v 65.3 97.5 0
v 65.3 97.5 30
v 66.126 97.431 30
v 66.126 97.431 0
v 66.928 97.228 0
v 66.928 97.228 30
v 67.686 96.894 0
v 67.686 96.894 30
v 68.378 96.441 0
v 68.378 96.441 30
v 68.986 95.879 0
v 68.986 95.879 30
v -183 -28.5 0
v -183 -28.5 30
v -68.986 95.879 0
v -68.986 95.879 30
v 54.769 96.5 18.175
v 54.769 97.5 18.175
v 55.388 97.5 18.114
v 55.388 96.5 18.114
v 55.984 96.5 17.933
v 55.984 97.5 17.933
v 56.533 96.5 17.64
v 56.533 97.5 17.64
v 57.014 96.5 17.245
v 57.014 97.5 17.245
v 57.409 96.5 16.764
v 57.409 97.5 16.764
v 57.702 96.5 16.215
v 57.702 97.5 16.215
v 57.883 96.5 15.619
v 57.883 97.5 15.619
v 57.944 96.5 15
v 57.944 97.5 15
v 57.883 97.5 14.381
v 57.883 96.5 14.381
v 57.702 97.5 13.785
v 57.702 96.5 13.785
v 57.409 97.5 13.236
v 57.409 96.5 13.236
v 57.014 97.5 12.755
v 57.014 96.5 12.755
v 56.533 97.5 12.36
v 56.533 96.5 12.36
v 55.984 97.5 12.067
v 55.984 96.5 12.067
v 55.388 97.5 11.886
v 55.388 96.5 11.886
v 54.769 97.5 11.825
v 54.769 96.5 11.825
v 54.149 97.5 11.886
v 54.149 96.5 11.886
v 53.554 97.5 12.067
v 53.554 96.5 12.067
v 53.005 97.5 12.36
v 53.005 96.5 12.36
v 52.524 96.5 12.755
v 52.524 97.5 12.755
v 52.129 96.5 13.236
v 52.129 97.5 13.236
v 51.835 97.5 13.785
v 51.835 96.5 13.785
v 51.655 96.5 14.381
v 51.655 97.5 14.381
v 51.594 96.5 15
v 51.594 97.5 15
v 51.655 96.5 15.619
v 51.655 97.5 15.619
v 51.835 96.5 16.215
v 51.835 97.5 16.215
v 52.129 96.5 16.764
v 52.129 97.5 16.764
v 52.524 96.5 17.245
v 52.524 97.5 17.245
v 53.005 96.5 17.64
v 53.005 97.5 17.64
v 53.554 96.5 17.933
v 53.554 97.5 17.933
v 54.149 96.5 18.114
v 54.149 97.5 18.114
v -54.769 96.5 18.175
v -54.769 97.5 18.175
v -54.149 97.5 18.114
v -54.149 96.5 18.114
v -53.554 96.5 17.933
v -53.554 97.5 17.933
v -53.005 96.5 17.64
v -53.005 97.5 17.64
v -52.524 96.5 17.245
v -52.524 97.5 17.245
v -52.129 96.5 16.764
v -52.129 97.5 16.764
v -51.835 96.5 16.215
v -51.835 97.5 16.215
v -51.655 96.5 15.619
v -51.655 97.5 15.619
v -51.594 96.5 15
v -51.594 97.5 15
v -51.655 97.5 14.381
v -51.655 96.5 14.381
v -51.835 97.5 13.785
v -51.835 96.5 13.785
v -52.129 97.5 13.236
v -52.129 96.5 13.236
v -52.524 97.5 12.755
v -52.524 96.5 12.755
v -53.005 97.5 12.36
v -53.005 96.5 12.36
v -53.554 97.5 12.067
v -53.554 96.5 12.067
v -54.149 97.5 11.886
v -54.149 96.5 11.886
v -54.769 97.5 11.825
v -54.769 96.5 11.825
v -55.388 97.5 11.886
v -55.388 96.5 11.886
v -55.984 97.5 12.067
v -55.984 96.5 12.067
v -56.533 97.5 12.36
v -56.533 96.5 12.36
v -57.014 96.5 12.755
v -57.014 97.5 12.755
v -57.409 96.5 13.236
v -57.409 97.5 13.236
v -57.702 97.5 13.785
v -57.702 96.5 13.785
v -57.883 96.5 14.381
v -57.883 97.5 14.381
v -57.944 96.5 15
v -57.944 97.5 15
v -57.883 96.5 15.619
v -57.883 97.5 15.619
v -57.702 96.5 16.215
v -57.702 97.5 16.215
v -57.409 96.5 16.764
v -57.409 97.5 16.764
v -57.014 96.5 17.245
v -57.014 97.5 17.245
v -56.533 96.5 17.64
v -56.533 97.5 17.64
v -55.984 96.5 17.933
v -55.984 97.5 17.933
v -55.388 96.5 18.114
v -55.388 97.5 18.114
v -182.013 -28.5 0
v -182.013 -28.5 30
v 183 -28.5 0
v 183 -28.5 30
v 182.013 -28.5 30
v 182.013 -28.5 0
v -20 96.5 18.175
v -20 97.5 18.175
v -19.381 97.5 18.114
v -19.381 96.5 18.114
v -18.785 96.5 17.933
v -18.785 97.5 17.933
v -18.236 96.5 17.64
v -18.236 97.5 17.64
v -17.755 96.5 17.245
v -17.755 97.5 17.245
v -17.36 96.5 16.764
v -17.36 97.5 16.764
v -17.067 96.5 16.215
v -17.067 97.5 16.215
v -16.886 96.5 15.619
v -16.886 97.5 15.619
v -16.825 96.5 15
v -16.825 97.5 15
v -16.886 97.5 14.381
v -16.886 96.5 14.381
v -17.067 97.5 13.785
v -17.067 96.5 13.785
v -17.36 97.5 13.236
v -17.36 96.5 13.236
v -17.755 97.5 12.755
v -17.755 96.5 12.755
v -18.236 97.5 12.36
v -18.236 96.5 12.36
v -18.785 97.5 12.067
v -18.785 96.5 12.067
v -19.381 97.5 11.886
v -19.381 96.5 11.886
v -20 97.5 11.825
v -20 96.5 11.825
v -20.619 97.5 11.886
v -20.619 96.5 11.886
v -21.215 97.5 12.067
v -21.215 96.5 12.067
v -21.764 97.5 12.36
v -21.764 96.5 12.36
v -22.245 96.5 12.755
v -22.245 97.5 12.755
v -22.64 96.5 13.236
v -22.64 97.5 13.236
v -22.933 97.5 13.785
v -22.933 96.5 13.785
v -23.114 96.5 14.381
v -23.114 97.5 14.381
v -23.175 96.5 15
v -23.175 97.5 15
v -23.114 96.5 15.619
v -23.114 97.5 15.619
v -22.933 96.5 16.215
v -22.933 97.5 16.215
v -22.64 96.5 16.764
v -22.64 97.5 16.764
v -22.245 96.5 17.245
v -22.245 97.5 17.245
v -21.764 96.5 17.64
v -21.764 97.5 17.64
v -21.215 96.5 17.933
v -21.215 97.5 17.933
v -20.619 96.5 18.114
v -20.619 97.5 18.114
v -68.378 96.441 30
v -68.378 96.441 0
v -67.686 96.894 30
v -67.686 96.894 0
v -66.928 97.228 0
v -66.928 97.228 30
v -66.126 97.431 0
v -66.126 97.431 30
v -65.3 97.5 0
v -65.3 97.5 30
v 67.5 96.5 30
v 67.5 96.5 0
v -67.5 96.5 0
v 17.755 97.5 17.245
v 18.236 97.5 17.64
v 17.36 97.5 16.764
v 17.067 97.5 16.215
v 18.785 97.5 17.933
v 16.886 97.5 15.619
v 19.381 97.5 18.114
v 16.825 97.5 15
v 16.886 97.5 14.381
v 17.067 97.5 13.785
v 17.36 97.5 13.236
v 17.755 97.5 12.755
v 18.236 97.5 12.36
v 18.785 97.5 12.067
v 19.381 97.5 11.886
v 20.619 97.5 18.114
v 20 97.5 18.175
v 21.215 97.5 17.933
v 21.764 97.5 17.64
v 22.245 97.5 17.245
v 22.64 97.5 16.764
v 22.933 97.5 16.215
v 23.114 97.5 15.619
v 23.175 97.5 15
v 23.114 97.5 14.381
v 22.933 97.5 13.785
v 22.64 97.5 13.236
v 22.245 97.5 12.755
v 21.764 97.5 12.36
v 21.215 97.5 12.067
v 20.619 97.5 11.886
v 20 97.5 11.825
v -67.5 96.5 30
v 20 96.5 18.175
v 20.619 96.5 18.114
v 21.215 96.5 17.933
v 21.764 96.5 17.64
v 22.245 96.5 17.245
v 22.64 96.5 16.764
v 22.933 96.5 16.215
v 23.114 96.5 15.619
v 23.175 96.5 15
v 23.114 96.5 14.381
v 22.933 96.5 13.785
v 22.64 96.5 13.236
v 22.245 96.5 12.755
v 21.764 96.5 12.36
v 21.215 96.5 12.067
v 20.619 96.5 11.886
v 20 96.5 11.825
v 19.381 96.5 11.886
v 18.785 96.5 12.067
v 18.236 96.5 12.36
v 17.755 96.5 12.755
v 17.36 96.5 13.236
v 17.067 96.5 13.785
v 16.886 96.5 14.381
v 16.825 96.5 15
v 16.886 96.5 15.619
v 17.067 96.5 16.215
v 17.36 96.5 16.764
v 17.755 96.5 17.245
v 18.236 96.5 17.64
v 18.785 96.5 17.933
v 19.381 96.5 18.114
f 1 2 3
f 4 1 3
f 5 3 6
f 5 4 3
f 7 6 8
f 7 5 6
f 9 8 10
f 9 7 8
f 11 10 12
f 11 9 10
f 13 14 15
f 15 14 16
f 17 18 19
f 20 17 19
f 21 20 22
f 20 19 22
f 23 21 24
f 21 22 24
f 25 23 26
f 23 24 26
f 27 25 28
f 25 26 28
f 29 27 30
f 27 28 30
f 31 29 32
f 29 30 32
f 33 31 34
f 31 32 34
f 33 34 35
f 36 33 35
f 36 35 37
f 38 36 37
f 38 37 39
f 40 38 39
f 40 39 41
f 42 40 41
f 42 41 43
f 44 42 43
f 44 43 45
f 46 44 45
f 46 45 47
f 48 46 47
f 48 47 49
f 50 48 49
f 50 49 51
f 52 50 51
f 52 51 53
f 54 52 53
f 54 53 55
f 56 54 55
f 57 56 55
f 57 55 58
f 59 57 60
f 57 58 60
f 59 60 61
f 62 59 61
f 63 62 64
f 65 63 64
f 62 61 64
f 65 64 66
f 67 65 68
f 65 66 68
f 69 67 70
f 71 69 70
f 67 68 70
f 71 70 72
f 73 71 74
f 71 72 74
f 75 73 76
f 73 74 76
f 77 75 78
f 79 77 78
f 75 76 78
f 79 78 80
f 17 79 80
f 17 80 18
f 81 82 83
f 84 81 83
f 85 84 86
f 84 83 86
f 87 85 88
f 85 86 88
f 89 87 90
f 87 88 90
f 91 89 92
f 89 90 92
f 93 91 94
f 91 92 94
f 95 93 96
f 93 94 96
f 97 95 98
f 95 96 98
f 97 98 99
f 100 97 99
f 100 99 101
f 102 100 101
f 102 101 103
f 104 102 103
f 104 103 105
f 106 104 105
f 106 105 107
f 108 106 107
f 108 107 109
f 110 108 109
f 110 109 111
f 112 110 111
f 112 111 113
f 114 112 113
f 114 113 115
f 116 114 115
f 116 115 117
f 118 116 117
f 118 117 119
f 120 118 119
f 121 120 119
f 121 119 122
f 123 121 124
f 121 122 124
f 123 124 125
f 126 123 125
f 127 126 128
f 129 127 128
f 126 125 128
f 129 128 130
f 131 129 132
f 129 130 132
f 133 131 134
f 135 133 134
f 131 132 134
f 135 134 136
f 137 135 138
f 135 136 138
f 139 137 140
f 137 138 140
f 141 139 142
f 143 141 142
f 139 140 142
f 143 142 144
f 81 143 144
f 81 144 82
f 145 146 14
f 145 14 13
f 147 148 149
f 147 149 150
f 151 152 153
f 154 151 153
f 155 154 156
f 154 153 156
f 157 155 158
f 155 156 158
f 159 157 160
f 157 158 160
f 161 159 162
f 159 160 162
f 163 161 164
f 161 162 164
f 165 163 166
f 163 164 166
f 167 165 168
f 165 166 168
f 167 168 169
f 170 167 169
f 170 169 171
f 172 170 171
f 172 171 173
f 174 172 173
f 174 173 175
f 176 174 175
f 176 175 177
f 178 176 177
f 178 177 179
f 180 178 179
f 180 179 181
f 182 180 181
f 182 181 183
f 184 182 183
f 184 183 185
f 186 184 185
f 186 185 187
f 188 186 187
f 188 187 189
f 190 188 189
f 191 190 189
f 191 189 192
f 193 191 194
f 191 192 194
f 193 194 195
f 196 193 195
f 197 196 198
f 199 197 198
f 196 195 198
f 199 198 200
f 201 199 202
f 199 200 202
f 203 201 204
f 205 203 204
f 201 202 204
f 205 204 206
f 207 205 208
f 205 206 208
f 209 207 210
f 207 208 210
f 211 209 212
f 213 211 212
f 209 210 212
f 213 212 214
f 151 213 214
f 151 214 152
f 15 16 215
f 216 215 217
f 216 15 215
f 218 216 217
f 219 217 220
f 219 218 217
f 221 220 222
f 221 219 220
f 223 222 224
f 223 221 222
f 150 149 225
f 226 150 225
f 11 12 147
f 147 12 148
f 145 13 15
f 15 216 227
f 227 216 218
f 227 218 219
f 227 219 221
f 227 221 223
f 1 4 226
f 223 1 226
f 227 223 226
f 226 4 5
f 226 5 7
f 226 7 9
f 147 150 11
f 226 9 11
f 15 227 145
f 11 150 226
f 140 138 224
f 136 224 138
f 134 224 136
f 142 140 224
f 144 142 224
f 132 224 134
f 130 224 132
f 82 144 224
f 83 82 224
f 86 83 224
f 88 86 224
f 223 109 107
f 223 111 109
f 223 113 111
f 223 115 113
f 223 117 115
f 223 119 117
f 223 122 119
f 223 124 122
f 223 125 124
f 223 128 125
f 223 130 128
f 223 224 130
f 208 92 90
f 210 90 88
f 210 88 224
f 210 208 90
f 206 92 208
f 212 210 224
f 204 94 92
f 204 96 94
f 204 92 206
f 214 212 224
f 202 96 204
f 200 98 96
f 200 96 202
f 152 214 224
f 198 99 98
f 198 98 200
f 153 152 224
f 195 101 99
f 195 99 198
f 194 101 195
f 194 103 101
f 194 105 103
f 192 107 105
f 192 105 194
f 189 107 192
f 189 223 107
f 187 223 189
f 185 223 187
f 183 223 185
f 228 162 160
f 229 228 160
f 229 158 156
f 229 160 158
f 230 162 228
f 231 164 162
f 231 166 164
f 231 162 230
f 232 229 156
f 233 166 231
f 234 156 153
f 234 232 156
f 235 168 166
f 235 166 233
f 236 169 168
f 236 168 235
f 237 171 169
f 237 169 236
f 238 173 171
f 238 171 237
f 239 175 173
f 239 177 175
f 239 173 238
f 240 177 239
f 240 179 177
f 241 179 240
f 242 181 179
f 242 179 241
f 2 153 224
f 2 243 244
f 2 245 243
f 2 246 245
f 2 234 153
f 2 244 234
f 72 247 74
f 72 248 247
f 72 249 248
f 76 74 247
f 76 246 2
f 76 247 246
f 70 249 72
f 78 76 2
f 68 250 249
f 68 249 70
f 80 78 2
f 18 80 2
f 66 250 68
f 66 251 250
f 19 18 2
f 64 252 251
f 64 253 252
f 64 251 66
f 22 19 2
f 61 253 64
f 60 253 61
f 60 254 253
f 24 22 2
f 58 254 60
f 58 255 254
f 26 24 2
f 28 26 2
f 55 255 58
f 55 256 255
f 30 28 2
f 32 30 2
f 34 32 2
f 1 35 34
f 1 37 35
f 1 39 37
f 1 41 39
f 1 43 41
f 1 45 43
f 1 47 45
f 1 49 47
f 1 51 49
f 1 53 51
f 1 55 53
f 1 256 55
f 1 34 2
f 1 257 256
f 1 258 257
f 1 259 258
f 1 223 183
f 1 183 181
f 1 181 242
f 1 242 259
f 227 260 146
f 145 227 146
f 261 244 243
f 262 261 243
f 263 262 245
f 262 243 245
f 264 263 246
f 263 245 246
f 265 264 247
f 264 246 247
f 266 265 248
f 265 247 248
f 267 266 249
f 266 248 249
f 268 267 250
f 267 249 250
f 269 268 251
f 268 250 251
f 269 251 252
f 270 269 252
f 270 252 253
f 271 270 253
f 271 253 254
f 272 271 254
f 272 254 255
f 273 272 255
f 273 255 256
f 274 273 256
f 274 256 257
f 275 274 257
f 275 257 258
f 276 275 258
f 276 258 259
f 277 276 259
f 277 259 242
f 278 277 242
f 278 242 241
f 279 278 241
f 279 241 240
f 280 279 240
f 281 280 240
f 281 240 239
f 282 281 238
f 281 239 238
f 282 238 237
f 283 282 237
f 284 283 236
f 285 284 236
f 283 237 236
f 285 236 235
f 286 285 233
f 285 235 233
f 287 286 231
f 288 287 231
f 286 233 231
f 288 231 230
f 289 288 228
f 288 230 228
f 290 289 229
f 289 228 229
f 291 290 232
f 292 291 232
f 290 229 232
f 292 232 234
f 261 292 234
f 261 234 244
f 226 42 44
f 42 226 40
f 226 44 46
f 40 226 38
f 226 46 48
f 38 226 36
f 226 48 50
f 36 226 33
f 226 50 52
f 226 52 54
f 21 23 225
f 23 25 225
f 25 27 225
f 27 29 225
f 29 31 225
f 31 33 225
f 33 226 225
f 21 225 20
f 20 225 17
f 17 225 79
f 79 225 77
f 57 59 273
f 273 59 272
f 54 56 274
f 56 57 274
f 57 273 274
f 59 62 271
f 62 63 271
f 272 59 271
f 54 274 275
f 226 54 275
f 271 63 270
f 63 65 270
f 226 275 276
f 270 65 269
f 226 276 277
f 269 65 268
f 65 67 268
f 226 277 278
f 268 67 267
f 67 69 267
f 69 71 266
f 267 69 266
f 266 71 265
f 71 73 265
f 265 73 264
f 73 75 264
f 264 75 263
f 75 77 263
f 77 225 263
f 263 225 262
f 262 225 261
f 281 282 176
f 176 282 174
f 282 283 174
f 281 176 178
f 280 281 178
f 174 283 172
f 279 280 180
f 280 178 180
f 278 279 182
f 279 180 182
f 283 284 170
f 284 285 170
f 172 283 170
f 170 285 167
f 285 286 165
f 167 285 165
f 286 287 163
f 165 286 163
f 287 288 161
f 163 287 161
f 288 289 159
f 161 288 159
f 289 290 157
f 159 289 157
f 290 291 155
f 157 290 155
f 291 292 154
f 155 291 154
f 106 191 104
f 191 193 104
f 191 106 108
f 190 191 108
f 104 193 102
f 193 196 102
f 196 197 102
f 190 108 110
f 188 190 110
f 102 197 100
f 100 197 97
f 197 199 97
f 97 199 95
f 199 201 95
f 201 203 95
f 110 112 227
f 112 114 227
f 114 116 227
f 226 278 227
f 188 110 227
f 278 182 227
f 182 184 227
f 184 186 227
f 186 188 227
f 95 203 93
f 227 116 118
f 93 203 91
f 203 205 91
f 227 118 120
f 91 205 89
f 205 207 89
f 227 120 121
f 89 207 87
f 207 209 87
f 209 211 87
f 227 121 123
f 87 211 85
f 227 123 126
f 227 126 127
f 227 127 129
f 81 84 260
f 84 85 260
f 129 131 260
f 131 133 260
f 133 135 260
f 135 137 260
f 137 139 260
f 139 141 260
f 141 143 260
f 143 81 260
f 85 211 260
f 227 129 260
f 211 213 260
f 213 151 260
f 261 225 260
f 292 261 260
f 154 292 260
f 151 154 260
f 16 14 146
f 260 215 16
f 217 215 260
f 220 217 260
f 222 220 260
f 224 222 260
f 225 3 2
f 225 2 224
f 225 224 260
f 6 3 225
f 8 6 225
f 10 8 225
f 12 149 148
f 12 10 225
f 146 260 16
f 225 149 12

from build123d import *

# Parameters (mm, degrees)
SKETCH1_W           = 410
SKETCH1_H           = 195
BOSS_EXTRUDE1_DEPTH = 30
CUT_EXTRUDE1_DEPTH  = 30
CUT_EXTRUDE2_DEPTH  = 30
FILLET1_R           = 5
FILLET4_R           = 5
FILLET5_R           = 5
FILLET6_R           = 5
SKETCH4_R           = 1.65
CUT_EXTRUDE3_DEPTH  = 423.5
SKETCH5_R           = 3.175
CUT_EXTRUDE4_DEPTH  = 10
SKETCH7_W           = 30
SKETCH7_H           = 69
CUT_EXTRUDE6_DEPTH  = 420


with BuildPart() as part:
    # Sketch1 → Boss-Extrude1 (new body)
    with BuildSketch(Plane.XY):
        Rectangle(SKETCH1_W, SKETCH1_H)
    extrude(amount=BOSS_EXTRUDE1_DEPTH)

    # Sketch2 → Cut-Extrude1 (cut)
    with BuildSketch(Plane.XY.offset(30)):
        Polygon((-205, 97.5), (-205, -52.5), (-67.5, 97.5), align=None)
        Polygon((205, 97.5), (67.5, 97.5), (205, -52.5), align=None)
    extrude(amount=-CUT_EXTRUDE1_DEPTH, mode=Mode.SUBTRACT)

    # Sketch3 → Cut-Extrude2 (cut)
    with BuildSketch(Plane.XY.offset(30)):
        Polygon((-67.5, 96.5), (-204, -52.5), (-204, -97.5), (204, -97.5), (204, -52.5), (67.5, 96.5), align=None)
    extrude(amount=-CUT_EXTRUDE2_DEPTH, mode=Mode.SUBTRACT)

    # Fillet1
    fillet1_edges = [part.edges().sort_by_distance(p)[0] for p in [
        (-205, -52.5, 15),
    ]]
    fillet(fillet1_edges, radius=FILLET1_R)

    # Fillet4
    fillet4_edges = [part.edges().sort_by_distance(p)[0] for p in [
        (-67.5, 97.5, 15),
    ]]
    fillet(fillet4_edges, radius=FILLET4_R)

    # Fillet5
    fillet5_edges = [part.edges().sort_by_distance(p)[0] for p in [
        (67.5, 97.5, 15),
    ]]
    fillet(fillet5_edges, radius=FILLET5_R)

    # Fillet6
    fillet6_edges = [part.edges().sort_by_distance(p)[0] for p in [
        (205, -52.5, 15),
    ]]
    fillet(fillet6_edges, radius=FILLET6_R)

    # Sketch4 → Cut-Extrude3 (cut, through all)
    with BuildSketch(Plane(origin=(205, 0, 0), x_dir=(0, 0, -1), z_dir=(1, 0, 0))):
        with Locations(Location((-15, -75.972459226, 0), (0, 0, 90))):
            Circle(SKETCH4_R)
    extrude(amount=-CUT_EXTRUDE3_DEPTH, mode=Mode.SUBTRACT)

    # Sketch5 → Cut-Extrude4 (cut)
    with BuildSketch(Plane(origin=(0, 97.5, 0), x_dir=(1, 0, 0), z_dir=(0, 1, 0))):
        with Locations(Location((-20, -15, 0), (0, 0, 270))):
            Circle(SKETCH5_R)
        with Locations(Location((20, -15, 0), (0, 0, 270))):
            Circle(SKETCH5_R)
        with Locations(Location((54.768750122, -15, 0), (0, 0, 270))):
            Circle(SKETCH5_R)
        with Locations(Location((-54.768749878, -15, 0), (0, 0, 270))):
            Circle(SKETCH5_R)
    extrude(amount=-CUT_EXTRUDE4_DEPTH, mode=Mode.SUBTRACT)

    # Sketch7 → Cut-Extrude6 (cut)
    with BuildSketch(Plane(origin=(210, 0, 0), x_dir=(0, 0, -1), z_dir=(1, 0, 0))):
        with Locations((-15, -63)):
            Rectangle(SKETCH7_W, SKETCH7_H)
    extrude(amount=-CUT_EXTRUDE6_DEPTH, mode=Mode.SUBTRACT)


solid = part.part
